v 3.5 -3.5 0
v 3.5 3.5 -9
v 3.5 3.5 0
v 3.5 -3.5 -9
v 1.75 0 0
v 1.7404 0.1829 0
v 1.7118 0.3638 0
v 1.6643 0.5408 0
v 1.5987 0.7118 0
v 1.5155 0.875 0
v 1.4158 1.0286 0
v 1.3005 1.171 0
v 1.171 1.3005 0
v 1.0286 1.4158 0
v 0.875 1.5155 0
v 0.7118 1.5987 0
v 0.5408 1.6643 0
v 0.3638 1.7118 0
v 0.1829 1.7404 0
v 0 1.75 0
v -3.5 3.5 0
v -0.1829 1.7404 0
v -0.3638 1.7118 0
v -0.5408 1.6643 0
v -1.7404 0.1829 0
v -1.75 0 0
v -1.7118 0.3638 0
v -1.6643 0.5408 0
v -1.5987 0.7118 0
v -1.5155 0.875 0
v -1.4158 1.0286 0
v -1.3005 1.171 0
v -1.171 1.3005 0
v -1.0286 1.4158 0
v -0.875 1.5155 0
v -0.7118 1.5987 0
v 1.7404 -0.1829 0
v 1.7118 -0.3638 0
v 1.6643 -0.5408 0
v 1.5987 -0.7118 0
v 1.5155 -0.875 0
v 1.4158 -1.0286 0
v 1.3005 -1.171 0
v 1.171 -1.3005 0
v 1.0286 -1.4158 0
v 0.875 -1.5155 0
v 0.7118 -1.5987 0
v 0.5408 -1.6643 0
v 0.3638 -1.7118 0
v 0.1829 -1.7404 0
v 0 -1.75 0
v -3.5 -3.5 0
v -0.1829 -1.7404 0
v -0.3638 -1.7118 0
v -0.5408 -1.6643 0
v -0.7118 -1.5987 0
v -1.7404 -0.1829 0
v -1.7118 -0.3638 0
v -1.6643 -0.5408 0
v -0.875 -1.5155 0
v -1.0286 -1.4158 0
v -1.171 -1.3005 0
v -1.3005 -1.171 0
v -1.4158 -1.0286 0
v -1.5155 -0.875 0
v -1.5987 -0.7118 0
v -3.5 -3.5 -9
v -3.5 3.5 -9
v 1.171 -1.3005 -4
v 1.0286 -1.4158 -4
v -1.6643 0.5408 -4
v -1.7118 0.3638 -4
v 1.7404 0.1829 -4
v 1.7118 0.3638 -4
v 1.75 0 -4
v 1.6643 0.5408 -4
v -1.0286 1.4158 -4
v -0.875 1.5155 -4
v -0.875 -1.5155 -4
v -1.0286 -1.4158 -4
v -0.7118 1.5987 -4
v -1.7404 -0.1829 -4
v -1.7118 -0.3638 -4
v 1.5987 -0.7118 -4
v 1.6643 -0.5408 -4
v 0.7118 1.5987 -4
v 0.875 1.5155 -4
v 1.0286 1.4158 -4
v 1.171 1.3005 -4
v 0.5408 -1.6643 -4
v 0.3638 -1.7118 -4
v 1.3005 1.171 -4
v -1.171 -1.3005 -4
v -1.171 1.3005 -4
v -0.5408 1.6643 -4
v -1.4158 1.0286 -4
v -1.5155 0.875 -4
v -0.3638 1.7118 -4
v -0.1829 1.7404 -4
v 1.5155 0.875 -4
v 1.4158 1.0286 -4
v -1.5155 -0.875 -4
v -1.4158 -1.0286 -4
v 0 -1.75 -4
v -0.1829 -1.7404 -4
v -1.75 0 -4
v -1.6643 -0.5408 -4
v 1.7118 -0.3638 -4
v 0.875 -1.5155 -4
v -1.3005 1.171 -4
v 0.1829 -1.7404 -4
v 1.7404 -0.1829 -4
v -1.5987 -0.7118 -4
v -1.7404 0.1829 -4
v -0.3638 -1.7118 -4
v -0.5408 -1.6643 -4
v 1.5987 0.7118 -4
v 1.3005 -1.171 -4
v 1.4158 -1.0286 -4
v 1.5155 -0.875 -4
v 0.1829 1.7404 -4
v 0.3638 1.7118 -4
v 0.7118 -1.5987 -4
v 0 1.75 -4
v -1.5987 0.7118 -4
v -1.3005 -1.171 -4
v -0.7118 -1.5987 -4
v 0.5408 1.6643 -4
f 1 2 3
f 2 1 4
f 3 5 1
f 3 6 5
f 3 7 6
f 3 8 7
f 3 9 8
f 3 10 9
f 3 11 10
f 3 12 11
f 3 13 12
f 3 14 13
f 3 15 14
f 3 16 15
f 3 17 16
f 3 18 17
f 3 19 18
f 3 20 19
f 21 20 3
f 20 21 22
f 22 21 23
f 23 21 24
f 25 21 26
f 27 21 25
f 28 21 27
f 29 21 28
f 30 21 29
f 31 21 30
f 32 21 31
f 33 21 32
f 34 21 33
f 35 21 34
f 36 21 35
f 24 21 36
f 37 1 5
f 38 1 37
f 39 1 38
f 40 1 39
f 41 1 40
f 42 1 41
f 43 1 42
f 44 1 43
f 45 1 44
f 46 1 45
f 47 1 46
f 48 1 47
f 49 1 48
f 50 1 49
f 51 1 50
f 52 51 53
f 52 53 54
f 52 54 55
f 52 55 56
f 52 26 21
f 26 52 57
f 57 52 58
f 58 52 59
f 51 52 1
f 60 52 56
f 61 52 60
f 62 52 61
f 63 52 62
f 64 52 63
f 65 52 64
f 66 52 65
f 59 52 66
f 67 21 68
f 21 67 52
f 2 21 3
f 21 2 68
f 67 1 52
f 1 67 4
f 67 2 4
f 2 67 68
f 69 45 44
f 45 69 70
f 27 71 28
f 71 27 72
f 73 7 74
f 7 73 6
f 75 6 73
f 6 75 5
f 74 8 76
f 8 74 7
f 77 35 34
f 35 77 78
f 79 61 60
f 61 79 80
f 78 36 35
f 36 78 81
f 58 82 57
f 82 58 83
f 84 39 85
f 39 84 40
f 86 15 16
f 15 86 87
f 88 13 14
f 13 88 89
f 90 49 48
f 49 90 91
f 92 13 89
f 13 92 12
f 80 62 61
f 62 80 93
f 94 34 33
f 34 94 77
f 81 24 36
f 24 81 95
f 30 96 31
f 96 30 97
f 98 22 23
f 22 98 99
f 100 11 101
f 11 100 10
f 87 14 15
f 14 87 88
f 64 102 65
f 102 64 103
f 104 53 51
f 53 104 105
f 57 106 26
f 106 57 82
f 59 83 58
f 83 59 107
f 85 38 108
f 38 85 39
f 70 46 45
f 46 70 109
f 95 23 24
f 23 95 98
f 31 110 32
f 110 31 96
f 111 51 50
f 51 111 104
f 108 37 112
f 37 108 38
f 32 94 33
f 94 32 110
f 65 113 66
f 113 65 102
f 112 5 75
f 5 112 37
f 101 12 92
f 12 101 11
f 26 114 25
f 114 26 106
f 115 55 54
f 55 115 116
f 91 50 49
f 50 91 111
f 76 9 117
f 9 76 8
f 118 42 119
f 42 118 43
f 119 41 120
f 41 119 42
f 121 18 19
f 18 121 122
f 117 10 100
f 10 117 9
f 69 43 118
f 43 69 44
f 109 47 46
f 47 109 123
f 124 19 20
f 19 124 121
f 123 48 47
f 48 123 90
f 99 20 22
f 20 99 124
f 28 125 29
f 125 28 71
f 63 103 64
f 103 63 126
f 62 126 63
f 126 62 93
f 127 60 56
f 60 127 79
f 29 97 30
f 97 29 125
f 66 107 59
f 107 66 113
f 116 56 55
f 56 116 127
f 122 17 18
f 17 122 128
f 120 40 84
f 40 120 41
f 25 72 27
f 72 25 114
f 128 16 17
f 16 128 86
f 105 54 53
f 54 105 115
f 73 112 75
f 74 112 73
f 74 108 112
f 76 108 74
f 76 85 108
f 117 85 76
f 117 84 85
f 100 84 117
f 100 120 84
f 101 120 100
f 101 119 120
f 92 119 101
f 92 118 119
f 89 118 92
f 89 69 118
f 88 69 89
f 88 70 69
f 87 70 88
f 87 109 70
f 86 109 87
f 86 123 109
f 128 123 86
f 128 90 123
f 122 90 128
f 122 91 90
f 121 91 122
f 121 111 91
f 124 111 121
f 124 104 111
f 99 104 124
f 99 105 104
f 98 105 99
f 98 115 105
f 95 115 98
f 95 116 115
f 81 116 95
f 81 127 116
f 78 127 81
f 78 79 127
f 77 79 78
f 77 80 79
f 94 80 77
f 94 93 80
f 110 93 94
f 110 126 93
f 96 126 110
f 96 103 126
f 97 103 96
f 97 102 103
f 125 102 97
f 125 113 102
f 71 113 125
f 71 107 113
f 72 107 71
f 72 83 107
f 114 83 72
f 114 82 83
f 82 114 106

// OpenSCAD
// to add holders for inserts

add_insert(_size="M2");

module add_insert(_size) {
    // _size: M2, M1.6
    if (_size=="M2") {
        // d1: external diameter
        // d2: external diameter
        // h1: pin hight
        // h2: internal space height
        // cube_h: hight of base cube, to be merged with box floor mostly
        insert_pin(_d1=5+2,_d2=3.5,_h1=8,_h2=4,_cube_h=1);
    } // of if()
    
    if (_size=="M1.6") {
        // d1: external diameter
        // d2: external diameter
        // h1: pin hight
        // h2: internal space height
        // cube_h: hight of base cube, to be merged with box floor mostly
        insert_pin(_d1=5+2,_d2=2.5,_h1=8,_h2=4,_cube_h=1);
    } // of if()
    
} // of add_insert()

module insert_pin(_d1,_d2,_h1,_h2,_cube_h=1) {
    
    
    // the cube on button is to help align on box's floor
//    d1 = 5;
//    d2 = 3.5;
//    h_ins = 8;
//    cube_h=1;
    
    translate([0,0,-_h1/2])
        difference() {
            union() {
                //cylinder(d=_d1,h=_h1,center=true,$fn=60);
                cube([_d1,_d1,_h1],center=true);
                translate([0,0,-_h1/2-_cube_h/2])
                    color("green")cube([_d1,_d1,1],center=true);
            } // of union()
            translate([0,0,_h1-_h2])
            cylinder(d=_d2,h=_h1,center=true,$fn=60);
    } // of difference()
} // of insert_pin
